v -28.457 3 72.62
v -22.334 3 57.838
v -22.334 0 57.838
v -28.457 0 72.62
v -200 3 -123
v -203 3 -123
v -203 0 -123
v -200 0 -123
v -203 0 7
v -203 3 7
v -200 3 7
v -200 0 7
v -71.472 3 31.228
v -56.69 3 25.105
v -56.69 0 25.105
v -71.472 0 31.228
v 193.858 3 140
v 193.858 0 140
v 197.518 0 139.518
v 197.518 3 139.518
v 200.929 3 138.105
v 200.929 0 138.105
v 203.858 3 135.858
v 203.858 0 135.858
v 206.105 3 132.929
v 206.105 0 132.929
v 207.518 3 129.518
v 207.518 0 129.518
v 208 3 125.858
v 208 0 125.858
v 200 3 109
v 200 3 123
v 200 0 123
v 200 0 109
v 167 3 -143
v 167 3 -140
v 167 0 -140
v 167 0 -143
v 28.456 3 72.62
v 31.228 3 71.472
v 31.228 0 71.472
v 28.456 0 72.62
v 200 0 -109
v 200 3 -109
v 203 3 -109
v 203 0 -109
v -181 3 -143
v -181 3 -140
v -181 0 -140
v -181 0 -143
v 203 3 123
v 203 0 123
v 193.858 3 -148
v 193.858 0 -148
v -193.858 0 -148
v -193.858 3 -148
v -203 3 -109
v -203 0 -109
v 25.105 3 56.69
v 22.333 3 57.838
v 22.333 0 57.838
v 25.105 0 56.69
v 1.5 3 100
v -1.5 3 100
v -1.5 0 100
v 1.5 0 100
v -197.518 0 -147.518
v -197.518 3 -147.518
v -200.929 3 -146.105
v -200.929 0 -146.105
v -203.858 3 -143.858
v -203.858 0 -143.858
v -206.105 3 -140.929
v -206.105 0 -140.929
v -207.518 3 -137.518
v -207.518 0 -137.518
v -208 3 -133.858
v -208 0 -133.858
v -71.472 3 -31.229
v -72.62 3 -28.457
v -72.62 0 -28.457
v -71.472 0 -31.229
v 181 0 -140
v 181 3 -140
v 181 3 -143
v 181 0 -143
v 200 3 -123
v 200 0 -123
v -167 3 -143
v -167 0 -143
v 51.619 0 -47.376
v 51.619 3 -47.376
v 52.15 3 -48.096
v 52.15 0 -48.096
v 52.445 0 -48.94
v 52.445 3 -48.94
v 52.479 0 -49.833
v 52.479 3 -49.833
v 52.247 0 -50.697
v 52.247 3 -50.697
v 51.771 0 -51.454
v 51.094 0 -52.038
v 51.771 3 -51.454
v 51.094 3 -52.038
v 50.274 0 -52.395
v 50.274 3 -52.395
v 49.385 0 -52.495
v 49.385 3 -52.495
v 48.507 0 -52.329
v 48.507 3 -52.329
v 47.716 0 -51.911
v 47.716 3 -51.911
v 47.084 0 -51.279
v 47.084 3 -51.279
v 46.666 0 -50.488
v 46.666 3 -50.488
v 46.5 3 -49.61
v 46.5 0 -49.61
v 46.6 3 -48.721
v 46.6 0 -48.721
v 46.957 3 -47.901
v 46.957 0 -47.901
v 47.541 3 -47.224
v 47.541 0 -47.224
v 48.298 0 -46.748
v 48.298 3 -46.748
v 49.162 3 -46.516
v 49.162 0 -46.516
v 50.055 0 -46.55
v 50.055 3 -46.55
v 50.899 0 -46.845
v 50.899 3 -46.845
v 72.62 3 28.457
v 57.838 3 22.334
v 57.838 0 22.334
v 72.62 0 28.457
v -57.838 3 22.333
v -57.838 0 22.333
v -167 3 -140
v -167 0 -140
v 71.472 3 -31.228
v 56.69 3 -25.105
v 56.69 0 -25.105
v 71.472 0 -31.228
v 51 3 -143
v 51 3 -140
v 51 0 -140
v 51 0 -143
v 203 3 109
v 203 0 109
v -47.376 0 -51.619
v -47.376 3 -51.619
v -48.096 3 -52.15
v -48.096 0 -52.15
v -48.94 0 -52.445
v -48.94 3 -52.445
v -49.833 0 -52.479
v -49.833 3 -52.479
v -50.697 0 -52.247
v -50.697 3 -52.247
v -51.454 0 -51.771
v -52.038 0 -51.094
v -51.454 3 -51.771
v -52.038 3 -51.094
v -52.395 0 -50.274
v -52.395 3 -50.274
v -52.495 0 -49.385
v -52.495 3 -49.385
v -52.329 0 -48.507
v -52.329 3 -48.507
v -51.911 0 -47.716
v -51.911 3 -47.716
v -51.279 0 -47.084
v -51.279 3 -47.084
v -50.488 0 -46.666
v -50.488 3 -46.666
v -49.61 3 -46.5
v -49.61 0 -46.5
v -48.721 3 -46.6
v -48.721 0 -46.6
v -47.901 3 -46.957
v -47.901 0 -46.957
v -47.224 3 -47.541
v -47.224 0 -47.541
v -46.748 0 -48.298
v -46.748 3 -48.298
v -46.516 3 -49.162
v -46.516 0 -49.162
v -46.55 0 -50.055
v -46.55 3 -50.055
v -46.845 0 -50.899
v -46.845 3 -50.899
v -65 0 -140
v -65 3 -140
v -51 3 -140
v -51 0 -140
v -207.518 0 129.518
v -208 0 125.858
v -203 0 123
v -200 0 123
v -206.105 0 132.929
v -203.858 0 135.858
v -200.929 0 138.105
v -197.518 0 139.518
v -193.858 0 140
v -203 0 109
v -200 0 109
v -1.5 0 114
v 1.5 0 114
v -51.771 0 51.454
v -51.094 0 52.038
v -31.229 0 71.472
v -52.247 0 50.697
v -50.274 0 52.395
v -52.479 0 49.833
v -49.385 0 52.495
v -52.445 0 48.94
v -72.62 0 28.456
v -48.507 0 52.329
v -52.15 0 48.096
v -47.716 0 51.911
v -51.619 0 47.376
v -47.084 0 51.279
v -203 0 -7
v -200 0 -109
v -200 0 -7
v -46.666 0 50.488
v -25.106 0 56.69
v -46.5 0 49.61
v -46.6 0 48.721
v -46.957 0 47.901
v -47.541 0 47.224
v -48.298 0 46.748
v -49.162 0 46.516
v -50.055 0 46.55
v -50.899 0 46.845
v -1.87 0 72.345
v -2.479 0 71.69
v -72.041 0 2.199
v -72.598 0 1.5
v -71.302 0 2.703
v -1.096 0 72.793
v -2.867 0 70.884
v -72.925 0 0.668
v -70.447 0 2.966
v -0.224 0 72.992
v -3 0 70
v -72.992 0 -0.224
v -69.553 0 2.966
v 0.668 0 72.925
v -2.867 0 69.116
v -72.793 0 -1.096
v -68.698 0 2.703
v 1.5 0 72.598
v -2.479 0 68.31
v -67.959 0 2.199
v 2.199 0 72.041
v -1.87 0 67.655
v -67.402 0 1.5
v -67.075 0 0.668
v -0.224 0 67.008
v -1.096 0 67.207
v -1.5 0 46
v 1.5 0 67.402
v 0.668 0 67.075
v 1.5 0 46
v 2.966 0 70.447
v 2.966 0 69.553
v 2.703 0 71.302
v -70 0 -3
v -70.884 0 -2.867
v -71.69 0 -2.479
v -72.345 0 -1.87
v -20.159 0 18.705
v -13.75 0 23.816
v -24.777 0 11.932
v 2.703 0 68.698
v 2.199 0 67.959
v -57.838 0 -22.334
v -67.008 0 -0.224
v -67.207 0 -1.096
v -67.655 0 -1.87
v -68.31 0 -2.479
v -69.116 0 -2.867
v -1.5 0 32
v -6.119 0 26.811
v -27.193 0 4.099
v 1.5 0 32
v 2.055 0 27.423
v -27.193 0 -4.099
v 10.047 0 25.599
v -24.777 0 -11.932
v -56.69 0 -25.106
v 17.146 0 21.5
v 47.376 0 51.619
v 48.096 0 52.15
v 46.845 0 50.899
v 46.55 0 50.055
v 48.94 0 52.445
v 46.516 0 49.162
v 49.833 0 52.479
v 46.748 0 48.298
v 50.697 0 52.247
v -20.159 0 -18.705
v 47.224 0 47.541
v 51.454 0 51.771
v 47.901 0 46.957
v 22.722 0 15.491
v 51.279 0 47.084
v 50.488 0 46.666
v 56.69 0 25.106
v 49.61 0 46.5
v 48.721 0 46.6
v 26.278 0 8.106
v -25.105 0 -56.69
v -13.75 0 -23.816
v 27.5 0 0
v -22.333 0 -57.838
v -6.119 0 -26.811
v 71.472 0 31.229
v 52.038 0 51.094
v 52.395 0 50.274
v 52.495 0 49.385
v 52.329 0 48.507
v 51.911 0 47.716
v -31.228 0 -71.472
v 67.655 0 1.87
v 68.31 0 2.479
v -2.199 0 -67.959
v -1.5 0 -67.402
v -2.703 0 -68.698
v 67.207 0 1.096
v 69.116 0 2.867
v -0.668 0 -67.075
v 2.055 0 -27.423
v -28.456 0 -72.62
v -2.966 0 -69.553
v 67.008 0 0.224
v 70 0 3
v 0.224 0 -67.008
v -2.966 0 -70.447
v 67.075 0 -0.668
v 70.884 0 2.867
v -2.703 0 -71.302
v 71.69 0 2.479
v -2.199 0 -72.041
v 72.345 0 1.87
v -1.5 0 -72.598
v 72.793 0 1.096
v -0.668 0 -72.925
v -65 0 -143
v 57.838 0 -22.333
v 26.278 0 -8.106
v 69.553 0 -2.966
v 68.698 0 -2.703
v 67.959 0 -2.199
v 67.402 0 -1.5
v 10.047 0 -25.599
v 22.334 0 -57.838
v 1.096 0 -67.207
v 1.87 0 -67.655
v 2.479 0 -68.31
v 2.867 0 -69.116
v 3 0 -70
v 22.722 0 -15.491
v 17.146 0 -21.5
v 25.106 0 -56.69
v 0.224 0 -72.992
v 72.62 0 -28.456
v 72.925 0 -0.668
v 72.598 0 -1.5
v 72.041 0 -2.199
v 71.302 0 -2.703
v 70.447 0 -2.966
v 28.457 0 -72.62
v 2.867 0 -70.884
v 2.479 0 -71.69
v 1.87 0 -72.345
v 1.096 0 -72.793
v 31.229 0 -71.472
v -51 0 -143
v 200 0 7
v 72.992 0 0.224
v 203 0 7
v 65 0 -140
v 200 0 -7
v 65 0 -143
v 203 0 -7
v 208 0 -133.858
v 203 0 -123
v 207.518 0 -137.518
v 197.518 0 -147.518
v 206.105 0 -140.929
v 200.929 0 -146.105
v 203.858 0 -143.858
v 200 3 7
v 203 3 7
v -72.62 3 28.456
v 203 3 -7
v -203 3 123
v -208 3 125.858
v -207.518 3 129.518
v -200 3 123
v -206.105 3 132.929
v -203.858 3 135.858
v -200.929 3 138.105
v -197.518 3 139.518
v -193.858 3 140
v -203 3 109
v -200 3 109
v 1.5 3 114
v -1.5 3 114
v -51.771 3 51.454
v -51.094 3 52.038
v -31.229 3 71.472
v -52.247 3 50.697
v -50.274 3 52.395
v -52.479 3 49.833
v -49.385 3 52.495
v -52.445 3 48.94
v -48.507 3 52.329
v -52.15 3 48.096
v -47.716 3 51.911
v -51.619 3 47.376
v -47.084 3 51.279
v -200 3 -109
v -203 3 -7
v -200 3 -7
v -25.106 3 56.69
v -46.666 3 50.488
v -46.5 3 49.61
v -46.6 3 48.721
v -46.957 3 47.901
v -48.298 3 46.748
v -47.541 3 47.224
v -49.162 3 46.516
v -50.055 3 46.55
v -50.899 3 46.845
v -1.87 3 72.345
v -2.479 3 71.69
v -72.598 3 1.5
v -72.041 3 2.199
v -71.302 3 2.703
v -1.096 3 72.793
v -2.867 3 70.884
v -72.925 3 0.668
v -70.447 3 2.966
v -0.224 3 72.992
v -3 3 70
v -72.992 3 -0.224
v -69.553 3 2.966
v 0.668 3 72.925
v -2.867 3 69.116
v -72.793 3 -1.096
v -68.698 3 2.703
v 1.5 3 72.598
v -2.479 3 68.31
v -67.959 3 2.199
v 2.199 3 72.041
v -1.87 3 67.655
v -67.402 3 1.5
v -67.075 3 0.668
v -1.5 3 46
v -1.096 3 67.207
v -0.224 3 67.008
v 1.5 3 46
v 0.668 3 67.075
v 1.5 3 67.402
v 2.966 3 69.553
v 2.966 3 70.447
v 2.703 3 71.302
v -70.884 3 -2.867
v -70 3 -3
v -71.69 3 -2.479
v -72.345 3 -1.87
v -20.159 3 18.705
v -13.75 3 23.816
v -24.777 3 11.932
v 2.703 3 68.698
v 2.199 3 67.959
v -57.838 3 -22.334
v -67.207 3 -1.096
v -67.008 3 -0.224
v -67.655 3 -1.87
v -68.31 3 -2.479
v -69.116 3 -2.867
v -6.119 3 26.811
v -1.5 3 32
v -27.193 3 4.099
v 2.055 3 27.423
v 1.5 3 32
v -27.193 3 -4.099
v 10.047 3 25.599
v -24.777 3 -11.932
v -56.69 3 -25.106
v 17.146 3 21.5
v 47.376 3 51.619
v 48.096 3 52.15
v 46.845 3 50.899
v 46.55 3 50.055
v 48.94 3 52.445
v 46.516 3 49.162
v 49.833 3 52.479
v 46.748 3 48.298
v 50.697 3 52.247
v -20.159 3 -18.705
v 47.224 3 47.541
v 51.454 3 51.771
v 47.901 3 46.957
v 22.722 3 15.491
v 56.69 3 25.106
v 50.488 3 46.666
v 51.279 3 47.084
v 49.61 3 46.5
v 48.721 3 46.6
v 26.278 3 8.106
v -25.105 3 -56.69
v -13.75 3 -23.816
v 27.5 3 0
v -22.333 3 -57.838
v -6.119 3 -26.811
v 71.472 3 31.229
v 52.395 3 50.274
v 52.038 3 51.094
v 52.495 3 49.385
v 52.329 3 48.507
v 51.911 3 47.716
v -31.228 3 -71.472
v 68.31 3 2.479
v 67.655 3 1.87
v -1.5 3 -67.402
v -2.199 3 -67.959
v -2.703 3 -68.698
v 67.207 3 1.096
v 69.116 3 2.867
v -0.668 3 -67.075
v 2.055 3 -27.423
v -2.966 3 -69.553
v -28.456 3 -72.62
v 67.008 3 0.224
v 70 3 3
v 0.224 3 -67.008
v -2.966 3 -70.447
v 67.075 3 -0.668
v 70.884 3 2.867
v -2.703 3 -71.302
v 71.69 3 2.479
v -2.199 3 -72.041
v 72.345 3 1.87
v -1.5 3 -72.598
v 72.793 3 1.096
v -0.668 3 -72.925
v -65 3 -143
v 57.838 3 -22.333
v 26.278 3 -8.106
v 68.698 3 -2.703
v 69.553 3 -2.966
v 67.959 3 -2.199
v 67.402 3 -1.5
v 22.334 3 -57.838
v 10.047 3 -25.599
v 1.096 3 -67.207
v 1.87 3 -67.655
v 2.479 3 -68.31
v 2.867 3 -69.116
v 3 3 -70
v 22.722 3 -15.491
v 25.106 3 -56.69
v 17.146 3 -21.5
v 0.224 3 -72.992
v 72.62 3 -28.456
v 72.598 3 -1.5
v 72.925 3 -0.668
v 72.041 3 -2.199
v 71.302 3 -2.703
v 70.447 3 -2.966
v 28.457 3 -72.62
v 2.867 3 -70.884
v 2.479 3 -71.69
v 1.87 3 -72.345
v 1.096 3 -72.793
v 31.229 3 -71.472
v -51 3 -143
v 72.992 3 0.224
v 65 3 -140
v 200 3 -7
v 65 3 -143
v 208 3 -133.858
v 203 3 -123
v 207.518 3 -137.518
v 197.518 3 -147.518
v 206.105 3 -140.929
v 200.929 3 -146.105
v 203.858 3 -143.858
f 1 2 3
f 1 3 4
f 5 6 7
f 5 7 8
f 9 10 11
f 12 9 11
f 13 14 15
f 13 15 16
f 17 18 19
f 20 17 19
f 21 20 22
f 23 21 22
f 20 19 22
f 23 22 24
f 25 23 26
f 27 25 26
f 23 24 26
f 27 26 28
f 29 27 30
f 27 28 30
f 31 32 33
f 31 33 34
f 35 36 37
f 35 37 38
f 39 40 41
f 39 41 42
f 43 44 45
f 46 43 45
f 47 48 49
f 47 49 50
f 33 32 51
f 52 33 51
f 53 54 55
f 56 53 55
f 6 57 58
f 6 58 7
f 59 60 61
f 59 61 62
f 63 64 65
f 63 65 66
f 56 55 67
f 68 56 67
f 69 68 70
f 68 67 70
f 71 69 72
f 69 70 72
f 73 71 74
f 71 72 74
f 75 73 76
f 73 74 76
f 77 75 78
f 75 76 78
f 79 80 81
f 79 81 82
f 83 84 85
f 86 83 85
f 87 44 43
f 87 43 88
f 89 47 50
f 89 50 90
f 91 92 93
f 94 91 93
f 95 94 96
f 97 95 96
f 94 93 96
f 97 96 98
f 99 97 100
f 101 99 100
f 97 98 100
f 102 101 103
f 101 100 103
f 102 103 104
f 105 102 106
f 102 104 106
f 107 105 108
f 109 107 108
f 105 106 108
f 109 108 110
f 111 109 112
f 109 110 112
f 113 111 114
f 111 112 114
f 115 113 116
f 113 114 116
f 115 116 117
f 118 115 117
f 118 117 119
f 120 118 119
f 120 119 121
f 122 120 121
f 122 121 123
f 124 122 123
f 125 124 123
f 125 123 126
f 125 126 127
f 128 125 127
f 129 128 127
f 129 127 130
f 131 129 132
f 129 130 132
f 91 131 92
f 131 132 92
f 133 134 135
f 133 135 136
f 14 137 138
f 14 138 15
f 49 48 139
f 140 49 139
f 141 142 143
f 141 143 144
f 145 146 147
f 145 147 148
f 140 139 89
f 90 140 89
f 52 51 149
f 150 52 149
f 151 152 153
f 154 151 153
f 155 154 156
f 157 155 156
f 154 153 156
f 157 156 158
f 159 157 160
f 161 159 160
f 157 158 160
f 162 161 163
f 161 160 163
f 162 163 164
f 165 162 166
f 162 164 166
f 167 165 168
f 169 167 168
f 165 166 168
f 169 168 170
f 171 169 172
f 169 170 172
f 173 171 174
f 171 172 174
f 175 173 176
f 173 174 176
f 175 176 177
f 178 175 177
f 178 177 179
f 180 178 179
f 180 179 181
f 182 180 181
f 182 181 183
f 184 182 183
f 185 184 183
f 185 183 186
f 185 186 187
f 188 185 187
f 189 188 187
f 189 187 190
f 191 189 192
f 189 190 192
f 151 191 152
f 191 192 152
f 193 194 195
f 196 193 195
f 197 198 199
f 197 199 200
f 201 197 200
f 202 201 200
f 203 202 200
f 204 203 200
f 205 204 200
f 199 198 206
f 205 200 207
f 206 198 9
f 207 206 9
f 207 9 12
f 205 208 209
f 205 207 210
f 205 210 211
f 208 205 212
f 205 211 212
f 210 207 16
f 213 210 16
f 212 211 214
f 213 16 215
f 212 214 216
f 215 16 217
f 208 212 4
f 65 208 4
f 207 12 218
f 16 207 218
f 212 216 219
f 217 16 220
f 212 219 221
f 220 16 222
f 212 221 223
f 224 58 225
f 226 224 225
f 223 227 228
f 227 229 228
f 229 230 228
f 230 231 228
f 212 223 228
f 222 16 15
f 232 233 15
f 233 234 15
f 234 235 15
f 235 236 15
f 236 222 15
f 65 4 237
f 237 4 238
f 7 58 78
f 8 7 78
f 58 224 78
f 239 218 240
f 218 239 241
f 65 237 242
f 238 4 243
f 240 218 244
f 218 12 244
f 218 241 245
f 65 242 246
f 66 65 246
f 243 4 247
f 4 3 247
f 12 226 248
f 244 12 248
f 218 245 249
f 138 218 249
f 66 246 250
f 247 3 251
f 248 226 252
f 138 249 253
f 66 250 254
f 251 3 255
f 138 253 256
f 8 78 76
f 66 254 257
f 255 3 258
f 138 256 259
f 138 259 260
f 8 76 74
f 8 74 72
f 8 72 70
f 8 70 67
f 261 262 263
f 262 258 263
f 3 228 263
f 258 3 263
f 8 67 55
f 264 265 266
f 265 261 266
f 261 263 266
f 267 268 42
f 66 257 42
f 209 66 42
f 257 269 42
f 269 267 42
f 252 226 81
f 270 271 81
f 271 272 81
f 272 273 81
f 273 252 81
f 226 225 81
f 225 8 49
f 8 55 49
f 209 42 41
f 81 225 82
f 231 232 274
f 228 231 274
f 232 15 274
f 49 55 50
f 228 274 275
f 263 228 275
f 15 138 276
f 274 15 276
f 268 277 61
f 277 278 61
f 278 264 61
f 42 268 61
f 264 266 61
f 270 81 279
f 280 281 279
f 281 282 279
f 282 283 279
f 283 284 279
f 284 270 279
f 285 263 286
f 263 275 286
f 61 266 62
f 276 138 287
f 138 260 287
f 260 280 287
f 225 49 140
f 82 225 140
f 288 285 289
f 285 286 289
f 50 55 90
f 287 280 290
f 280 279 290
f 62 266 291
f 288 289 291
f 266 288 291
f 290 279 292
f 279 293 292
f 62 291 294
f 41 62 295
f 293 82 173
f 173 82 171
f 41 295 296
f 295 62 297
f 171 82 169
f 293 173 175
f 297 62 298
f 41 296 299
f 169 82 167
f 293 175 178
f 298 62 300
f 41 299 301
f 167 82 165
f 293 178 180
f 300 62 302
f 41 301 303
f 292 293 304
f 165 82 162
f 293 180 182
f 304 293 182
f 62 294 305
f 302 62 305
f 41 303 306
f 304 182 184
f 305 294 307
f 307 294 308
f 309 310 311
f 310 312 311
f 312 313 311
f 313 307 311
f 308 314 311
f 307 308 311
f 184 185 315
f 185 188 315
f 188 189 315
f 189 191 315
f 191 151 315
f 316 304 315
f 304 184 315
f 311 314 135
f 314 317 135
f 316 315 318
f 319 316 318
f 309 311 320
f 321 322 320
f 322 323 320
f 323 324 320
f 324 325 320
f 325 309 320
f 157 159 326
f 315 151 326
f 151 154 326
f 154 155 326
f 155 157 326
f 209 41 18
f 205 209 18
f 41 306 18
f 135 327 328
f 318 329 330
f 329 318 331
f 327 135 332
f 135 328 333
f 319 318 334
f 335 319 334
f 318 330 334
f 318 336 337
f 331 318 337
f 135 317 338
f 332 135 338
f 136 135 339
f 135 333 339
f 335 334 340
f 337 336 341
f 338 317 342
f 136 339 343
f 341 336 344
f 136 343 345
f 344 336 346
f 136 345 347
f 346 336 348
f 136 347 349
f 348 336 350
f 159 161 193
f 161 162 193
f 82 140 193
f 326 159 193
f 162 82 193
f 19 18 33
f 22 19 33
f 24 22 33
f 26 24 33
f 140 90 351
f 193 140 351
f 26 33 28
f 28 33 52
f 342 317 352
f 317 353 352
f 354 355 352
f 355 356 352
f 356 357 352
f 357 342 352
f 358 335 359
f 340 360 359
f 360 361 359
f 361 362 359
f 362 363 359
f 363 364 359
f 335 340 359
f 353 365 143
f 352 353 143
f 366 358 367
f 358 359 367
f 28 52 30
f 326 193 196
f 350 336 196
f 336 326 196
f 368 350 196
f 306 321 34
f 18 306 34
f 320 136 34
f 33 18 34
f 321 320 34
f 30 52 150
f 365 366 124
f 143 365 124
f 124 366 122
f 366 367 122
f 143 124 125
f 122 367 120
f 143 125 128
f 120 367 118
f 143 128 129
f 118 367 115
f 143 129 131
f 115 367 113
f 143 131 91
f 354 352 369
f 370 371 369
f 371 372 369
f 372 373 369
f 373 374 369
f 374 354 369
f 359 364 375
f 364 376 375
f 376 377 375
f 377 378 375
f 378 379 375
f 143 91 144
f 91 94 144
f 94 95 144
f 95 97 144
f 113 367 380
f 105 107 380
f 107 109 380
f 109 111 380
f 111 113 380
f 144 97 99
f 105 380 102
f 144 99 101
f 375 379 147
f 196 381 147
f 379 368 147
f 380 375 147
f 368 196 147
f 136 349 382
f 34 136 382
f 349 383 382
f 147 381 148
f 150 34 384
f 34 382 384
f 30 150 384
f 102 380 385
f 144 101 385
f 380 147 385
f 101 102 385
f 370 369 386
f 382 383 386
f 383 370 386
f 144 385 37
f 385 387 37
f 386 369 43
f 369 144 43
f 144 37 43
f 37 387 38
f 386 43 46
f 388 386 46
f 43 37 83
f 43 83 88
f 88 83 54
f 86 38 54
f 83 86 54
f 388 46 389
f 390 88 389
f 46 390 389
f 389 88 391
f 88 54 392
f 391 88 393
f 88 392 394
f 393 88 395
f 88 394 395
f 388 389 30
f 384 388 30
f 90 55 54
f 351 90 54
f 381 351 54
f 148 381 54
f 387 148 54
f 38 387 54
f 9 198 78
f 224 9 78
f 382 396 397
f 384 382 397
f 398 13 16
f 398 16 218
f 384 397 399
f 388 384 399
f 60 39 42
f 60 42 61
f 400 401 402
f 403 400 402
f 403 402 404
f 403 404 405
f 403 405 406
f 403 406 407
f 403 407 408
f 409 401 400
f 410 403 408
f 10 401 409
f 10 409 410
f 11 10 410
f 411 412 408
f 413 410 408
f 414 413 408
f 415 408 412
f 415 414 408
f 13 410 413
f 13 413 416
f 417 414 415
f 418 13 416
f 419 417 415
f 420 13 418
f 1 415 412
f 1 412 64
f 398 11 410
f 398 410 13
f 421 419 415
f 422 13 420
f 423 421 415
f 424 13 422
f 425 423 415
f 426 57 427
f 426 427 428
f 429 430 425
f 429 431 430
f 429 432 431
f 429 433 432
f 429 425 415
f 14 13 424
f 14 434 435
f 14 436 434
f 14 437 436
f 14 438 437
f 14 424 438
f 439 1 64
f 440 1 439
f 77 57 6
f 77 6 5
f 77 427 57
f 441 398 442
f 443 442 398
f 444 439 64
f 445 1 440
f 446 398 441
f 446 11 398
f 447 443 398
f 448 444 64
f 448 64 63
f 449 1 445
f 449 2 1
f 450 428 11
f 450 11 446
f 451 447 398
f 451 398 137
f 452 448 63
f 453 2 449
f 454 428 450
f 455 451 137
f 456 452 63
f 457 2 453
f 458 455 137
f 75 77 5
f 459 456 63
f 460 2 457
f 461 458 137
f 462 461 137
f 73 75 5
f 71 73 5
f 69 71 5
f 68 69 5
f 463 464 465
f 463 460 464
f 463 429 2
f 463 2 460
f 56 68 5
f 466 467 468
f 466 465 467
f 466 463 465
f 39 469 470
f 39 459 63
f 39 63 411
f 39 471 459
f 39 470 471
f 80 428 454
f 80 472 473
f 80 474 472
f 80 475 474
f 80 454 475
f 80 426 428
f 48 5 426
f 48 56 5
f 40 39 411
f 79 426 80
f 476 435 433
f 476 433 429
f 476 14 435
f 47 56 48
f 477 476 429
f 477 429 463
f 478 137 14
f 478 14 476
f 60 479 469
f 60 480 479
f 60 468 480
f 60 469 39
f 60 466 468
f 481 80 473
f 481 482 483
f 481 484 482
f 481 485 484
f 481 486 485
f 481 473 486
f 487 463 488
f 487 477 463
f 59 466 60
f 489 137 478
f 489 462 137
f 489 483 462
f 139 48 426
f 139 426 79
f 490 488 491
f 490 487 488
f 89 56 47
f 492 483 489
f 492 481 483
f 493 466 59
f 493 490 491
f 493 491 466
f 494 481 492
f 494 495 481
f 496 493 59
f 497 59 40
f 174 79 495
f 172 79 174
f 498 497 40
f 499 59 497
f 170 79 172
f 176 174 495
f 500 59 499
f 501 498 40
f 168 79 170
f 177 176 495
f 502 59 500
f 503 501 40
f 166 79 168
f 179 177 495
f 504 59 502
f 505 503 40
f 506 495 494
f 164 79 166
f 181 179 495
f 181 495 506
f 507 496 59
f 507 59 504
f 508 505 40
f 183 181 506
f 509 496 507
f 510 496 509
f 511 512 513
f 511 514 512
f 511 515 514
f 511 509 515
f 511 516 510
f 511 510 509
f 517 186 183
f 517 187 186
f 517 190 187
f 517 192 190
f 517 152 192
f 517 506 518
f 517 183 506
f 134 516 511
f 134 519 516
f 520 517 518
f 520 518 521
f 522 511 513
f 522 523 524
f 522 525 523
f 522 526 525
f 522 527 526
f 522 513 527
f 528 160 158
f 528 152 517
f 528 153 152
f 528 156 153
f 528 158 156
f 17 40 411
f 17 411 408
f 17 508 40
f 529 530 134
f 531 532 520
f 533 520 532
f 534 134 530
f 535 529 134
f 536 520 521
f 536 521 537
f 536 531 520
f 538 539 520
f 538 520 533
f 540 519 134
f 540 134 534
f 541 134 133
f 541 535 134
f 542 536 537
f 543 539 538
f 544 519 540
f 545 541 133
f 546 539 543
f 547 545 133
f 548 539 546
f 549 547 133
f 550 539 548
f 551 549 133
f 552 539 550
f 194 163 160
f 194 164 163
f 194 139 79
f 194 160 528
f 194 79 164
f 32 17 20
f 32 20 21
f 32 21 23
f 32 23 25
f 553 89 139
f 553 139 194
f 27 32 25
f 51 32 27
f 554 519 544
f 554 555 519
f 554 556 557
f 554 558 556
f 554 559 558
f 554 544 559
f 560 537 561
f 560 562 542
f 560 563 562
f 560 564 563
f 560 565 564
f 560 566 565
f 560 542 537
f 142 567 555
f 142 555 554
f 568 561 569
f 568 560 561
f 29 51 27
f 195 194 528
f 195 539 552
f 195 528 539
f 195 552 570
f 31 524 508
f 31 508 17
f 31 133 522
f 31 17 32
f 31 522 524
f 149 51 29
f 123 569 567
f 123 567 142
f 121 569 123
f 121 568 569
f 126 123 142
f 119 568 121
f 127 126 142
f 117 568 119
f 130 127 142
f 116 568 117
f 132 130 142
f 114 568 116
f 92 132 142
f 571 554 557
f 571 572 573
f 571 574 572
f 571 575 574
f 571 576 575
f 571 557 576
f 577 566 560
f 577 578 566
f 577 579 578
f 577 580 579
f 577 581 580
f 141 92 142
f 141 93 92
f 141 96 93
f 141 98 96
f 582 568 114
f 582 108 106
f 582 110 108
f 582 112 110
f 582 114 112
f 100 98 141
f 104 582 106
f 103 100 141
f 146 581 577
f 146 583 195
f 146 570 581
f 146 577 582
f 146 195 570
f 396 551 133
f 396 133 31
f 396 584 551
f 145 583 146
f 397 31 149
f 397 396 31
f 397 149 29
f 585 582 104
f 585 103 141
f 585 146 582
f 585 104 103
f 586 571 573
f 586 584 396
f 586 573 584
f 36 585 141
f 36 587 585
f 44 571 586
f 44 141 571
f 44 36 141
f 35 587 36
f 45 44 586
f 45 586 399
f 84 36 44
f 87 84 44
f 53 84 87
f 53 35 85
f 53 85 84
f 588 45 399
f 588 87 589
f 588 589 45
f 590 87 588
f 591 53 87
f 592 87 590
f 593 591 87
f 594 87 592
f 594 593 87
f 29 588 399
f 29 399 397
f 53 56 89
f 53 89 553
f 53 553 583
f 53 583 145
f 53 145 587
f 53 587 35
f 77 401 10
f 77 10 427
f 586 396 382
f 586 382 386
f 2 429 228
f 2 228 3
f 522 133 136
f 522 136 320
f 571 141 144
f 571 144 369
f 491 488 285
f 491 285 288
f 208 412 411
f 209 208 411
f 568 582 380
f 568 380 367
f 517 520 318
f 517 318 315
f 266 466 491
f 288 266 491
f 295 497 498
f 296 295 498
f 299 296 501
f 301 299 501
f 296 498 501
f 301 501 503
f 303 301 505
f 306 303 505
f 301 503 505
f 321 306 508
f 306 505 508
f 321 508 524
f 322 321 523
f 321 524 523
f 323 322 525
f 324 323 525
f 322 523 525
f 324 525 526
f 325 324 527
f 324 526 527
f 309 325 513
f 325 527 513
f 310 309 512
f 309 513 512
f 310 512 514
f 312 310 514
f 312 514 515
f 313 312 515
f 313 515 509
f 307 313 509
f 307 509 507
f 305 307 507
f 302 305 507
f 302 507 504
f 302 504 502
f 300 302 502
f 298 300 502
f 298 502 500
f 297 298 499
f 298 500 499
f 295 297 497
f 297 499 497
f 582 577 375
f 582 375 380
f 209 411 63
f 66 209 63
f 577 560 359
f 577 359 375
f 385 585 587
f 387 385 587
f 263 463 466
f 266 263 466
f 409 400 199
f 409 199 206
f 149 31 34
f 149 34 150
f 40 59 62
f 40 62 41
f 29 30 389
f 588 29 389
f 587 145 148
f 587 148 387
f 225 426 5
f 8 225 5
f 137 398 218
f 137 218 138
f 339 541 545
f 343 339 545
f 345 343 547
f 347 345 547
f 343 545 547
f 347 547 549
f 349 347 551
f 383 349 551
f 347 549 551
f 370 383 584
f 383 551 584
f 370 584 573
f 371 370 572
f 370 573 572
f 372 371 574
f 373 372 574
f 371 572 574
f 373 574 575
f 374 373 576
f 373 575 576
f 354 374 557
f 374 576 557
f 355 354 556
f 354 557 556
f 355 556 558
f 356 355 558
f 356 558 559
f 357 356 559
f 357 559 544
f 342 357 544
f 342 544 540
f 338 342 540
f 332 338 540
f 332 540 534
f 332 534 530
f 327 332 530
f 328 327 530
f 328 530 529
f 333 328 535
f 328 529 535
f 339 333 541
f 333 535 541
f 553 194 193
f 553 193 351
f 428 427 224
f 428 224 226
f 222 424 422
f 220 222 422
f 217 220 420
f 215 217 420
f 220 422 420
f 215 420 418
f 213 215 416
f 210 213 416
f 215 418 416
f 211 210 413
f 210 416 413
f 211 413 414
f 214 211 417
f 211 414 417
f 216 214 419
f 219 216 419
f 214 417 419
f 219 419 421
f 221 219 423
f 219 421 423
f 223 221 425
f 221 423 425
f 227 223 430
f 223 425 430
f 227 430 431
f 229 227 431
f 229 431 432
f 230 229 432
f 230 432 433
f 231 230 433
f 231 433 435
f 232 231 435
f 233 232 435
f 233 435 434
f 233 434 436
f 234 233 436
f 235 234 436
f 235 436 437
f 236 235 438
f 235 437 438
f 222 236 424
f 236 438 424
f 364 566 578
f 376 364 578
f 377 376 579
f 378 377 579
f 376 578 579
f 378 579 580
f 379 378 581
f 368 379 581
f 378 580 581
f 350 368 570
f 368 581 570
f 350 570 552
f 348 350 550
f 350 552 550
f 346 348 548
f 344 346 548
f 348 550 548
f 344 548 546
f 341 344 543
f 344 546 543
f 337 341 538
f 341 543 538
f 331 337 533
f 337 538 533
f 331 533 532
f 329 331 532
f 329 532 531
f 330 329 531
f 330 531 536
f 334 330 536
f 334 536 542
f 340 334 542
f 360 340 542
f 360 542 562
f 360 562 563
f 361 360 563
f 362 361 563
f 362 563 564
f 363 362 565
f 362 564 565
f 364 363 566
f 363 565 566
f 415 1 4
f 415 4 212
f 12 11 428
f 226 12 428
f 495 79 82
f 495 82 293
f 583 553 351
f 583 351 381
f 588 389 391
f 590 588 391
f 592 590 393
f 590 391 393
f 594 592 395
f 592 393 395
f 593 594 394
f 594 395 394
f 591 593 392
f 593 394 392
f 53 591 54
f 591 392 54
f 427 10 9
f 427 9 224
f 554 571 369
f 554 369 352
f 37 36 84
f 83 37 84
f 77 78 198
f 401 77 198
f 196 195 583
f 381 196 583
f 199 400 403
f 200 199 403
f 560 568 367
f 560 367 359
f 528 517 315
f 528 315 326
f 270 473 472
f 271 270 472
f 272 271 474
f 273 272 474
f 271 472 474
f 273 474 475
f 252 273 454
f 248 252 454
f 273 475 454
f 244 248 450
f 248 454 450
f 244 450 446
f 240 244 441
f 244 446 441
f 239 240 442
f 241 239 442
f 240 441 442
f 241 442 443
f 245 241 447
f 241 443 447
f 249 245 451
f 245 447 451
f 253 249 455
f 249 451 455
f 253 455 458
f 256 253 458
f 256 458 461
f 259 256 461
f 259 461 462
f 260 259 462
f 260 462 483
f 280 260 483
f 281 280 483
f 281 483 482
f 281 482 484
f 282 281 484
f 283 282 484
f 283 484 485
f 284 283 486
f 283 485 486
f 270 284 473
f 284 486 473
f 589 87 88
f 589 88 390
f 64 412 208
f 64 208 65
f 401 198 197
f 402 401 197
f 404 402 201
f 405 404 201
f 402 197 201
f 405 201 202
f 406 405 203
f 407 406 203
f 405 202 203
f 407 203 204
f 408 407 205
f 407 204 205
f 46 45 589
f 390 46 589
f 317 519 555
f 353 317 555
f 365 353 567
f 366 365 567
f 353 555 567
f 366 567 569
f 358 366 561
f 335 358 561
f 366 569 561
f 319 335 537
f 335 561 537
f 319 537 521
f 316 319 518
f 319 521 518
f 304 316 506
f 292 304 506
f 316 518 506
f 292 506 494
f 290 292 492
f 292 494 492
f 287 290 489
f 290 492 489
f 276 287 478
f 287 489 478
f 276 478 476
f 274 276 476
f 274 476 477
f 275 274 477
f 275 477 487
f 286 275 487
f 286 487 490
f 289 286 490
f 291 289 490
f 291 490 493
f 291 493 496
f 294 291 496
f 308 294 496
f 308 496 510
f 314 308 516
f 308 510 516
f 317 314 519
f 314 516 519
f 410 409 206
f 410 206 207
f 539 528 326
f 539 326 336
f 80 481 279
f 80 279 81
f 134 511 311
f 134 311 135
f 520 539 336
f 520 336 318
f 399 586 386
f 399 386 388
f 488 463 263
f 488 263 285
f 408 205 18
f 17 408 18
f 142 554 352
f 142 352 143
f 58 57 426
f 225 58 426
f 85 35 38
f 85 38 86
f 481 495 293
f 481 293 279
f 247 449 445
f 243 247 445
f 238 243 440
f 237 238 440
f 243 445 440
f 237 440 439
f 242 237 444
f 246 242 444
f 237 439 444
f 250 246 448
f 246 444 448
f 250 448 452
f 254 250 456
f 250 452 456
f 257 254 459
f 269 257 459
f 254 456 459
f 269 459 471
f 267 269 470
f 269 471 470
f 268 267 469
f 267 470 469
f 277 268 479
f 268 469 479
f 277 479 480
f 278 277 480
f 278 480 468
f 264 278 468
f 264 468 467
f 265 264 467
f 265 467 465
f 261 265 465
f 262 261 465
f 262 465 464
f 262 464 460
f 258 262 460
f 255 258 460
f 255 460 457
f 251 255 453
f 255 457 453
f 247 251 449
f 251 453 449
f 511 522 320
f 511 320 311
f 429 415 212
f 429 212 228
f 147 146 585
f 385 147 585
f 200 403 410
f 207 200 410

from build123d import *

# Parameters (mm, degrees)
BOSS_EXTRUDE1_DEPTH = 3
CUT_EXTRUDE1_DEPTH  = 3
SKETCH3_R           = 27.5
CUT_EXTRUDE2_DEPTH  = 3
CIRPATTERN1_COUNT   = 8
SKETCH5_R           = 3
CUT_EXTRUDE4_DEPTH  = 3
CIRPATTERN2_COUNT   = 8
SKETCH6_W           = 14
SKETCH6_H           = 3
CUT_EXTRUDE7_DEPTH  = 3
SKETCH8_W           = 3
SKETCH8_H           = 14
CUT_EXTRUDE8_DEPTH  = 3
SKETCH10_W          = 3
SKETCH10_H          = 14
CUT_EXTRUDE9_DEPTH  = 3


with BuildPart() as part:
    # Sketch1 → Boss-Extrude1 (new body)
    with BuildSketch(Plane(origin=(0, 0, 0), x_dir=(1, 0, 0), z_dir=(0, 1, 0))):
        with BuildLine():
            Line((-193.857864376, -140), (193.857864376, -140))
            ThreePointArc((193.857864376, -140), (203.857864376, -135.857864376), (208, -125.857864376))
            Line((208, -125.857864376), (208, 133.857864376))
            ThreePointArc((208, 133.857864376), (203.857864376, 143.857864376), (193.857864376, 148))
            Line((193.857864376, 148), (-193.857864376, 148))
            ThreePointArc((-193.857864376, 148), (-203.857864376, 143.857864376), (-208, 133.857864376))
            Line((-208, 133.857864376), (-208, -125.857864376))
            ThreePointArc((-208, -125.857864376), (-203.857864376, -135.857864376), (-193.857864376, -140))
        make_face()
    extrude(amount=BOSS_EXTRUDE1_DEPTH)

    # Sketch2 → Cut-Extrude1 (cut)
    with BuildSketch(Plane(origin=(0, 3, 0), x_dir=(1, 0, 0), z_dir=(0, 1, 0))):
        Polygon((-31.227780816, 71.471989723), (-28.456142219, 72.62004002), (-22.333207301, 57.8379675), (-25.104845898, 56.689917202), align=None)
    cut_extrude1 = extrude(amount=-CUT_EXTRUDE1_DEPTH, mode=Mode.SUBTRACT)

    # Sketch3 → Cut-Extrude2 (cut)
    with BuildSketch(Plane(origin=(0, 3, 0), x_dir=(1, 0, 0), z_dir=(0, 1, 0))):
        Circle(SKETCH3_R)
    extrude(amount=-CUT_EXTRUDE2_DEPTH, mode=Mode.SUBTRACT)

    # CirPattern1: Cut-Extrude1 ×8 about axis
    cirpattern1_axis = Axis((0, 0, 0), (0, 1, 0))
    for i in range(1, CIRPATTERN1_COUNT):
        add(cut_extrude1.rotate(cirpattern1_axis, i * 360 / CIRPATTERN1_COUNT), mode=Mode.SUBTRACT)

    # Sketch5 → Cut-Extrude4 (cut)
    with BuildSketch(Plane(origin=(0, 3, 0), x_dir=(1, 0, 0), z_dir=(0, 1, 0))):
        with Locations((0, 70)):
            Circle(SKETCH5_R)
    cut_extrude4 = extrude(amount=-CUT_EXTRUDE4_DEPTH, mode=Mode.SUBTRACT)

    # CirPattern2: Cut-Extrude4 ×8 about axis
    cirpattern2_axis = Axis((0, 0, 0), (0, 1, 0))
    for i in range(1, CIRPATTERN2_COUNT):
        add(cut_extrude4.rotate(cirpattern2_axis, i * 360 / CIRPATTERN2_COUNT), mode=Mode.SUBTRACT)

    # Sketch6 → Cut-Extrude7 (cut)
    with BuildSketch(Plane(origin=(0, 3, 0), x_dir=(1, 0, 0), z_dir=(0, 1, 0))):
        with Locations((174, 141.5)):
            Rectangle(SKETCH6_W, SKETCH6_H)
        with Locations((-174, 141.5)):
            Rectangle(SKETCH6_W, SKETCH6_H)
        with Locations((58, 141.5)):
            Rectangle(SKETCH6_W, SKETCH6_H)
        with Locations((-58, 141.5)):
            Rectangle(SKETCH6_W, SKETCH6_H)
    extrude(amount=-CUT_EXTRUDE7_DEPTH, mode=Mode.SUBTRACT)

    # Sketch8 → Cut-Extrude8 (cut)
    with BuildSketch(Plane(origin=(0, 3, 0), x_dir=(1, 0, 0), z_dir=(0, 1, 0))):
        with Locations((201.5, 116)):
            Rectangle(SKETCH8_W, SKETCH8_H)
        with Locations((-201.5, 116)):
            Rectangle(SKETCH8_W, SKETCH8_H)
        with Locations((201.5, 0)):
            Rectangle(SKETCH8_W, SKETCH8_H)
        with Locations((-201.5, 0)):
            Rectangle(SKETCH8_W, SKETCH8_H)
        with Locations((201.5, -116)):
            Rectangle(SKETCH8_W, SKETCH8_H)
        with Locations((-201.5, -116)):
            Rectangle(SKETCH8_W, SKETCH8_H)
    extrude(amount=-CUT_EXTRUDE8_DEPTH, mode=Mode.SUBTRACT)

    # Sketch10 → Cut-Extrude9 (cut)
    with BuildSketch(Plane(origin=(0, 3, 0), x_dir=(1, 0, 0), z_dir=(0, 1, 0))):
        with Locations((0, -39)):
            Rectangle(SKETCH10_W, SKETCH10_H)
        with Locations((0, -107)):
            Rectangle(SKETCH10_W, SKETCH10_H)
    extrude(amount=-CUT_EXTRUDE9_DEPTH, mode=Mode.SUBTRACT)


solid = part.part
